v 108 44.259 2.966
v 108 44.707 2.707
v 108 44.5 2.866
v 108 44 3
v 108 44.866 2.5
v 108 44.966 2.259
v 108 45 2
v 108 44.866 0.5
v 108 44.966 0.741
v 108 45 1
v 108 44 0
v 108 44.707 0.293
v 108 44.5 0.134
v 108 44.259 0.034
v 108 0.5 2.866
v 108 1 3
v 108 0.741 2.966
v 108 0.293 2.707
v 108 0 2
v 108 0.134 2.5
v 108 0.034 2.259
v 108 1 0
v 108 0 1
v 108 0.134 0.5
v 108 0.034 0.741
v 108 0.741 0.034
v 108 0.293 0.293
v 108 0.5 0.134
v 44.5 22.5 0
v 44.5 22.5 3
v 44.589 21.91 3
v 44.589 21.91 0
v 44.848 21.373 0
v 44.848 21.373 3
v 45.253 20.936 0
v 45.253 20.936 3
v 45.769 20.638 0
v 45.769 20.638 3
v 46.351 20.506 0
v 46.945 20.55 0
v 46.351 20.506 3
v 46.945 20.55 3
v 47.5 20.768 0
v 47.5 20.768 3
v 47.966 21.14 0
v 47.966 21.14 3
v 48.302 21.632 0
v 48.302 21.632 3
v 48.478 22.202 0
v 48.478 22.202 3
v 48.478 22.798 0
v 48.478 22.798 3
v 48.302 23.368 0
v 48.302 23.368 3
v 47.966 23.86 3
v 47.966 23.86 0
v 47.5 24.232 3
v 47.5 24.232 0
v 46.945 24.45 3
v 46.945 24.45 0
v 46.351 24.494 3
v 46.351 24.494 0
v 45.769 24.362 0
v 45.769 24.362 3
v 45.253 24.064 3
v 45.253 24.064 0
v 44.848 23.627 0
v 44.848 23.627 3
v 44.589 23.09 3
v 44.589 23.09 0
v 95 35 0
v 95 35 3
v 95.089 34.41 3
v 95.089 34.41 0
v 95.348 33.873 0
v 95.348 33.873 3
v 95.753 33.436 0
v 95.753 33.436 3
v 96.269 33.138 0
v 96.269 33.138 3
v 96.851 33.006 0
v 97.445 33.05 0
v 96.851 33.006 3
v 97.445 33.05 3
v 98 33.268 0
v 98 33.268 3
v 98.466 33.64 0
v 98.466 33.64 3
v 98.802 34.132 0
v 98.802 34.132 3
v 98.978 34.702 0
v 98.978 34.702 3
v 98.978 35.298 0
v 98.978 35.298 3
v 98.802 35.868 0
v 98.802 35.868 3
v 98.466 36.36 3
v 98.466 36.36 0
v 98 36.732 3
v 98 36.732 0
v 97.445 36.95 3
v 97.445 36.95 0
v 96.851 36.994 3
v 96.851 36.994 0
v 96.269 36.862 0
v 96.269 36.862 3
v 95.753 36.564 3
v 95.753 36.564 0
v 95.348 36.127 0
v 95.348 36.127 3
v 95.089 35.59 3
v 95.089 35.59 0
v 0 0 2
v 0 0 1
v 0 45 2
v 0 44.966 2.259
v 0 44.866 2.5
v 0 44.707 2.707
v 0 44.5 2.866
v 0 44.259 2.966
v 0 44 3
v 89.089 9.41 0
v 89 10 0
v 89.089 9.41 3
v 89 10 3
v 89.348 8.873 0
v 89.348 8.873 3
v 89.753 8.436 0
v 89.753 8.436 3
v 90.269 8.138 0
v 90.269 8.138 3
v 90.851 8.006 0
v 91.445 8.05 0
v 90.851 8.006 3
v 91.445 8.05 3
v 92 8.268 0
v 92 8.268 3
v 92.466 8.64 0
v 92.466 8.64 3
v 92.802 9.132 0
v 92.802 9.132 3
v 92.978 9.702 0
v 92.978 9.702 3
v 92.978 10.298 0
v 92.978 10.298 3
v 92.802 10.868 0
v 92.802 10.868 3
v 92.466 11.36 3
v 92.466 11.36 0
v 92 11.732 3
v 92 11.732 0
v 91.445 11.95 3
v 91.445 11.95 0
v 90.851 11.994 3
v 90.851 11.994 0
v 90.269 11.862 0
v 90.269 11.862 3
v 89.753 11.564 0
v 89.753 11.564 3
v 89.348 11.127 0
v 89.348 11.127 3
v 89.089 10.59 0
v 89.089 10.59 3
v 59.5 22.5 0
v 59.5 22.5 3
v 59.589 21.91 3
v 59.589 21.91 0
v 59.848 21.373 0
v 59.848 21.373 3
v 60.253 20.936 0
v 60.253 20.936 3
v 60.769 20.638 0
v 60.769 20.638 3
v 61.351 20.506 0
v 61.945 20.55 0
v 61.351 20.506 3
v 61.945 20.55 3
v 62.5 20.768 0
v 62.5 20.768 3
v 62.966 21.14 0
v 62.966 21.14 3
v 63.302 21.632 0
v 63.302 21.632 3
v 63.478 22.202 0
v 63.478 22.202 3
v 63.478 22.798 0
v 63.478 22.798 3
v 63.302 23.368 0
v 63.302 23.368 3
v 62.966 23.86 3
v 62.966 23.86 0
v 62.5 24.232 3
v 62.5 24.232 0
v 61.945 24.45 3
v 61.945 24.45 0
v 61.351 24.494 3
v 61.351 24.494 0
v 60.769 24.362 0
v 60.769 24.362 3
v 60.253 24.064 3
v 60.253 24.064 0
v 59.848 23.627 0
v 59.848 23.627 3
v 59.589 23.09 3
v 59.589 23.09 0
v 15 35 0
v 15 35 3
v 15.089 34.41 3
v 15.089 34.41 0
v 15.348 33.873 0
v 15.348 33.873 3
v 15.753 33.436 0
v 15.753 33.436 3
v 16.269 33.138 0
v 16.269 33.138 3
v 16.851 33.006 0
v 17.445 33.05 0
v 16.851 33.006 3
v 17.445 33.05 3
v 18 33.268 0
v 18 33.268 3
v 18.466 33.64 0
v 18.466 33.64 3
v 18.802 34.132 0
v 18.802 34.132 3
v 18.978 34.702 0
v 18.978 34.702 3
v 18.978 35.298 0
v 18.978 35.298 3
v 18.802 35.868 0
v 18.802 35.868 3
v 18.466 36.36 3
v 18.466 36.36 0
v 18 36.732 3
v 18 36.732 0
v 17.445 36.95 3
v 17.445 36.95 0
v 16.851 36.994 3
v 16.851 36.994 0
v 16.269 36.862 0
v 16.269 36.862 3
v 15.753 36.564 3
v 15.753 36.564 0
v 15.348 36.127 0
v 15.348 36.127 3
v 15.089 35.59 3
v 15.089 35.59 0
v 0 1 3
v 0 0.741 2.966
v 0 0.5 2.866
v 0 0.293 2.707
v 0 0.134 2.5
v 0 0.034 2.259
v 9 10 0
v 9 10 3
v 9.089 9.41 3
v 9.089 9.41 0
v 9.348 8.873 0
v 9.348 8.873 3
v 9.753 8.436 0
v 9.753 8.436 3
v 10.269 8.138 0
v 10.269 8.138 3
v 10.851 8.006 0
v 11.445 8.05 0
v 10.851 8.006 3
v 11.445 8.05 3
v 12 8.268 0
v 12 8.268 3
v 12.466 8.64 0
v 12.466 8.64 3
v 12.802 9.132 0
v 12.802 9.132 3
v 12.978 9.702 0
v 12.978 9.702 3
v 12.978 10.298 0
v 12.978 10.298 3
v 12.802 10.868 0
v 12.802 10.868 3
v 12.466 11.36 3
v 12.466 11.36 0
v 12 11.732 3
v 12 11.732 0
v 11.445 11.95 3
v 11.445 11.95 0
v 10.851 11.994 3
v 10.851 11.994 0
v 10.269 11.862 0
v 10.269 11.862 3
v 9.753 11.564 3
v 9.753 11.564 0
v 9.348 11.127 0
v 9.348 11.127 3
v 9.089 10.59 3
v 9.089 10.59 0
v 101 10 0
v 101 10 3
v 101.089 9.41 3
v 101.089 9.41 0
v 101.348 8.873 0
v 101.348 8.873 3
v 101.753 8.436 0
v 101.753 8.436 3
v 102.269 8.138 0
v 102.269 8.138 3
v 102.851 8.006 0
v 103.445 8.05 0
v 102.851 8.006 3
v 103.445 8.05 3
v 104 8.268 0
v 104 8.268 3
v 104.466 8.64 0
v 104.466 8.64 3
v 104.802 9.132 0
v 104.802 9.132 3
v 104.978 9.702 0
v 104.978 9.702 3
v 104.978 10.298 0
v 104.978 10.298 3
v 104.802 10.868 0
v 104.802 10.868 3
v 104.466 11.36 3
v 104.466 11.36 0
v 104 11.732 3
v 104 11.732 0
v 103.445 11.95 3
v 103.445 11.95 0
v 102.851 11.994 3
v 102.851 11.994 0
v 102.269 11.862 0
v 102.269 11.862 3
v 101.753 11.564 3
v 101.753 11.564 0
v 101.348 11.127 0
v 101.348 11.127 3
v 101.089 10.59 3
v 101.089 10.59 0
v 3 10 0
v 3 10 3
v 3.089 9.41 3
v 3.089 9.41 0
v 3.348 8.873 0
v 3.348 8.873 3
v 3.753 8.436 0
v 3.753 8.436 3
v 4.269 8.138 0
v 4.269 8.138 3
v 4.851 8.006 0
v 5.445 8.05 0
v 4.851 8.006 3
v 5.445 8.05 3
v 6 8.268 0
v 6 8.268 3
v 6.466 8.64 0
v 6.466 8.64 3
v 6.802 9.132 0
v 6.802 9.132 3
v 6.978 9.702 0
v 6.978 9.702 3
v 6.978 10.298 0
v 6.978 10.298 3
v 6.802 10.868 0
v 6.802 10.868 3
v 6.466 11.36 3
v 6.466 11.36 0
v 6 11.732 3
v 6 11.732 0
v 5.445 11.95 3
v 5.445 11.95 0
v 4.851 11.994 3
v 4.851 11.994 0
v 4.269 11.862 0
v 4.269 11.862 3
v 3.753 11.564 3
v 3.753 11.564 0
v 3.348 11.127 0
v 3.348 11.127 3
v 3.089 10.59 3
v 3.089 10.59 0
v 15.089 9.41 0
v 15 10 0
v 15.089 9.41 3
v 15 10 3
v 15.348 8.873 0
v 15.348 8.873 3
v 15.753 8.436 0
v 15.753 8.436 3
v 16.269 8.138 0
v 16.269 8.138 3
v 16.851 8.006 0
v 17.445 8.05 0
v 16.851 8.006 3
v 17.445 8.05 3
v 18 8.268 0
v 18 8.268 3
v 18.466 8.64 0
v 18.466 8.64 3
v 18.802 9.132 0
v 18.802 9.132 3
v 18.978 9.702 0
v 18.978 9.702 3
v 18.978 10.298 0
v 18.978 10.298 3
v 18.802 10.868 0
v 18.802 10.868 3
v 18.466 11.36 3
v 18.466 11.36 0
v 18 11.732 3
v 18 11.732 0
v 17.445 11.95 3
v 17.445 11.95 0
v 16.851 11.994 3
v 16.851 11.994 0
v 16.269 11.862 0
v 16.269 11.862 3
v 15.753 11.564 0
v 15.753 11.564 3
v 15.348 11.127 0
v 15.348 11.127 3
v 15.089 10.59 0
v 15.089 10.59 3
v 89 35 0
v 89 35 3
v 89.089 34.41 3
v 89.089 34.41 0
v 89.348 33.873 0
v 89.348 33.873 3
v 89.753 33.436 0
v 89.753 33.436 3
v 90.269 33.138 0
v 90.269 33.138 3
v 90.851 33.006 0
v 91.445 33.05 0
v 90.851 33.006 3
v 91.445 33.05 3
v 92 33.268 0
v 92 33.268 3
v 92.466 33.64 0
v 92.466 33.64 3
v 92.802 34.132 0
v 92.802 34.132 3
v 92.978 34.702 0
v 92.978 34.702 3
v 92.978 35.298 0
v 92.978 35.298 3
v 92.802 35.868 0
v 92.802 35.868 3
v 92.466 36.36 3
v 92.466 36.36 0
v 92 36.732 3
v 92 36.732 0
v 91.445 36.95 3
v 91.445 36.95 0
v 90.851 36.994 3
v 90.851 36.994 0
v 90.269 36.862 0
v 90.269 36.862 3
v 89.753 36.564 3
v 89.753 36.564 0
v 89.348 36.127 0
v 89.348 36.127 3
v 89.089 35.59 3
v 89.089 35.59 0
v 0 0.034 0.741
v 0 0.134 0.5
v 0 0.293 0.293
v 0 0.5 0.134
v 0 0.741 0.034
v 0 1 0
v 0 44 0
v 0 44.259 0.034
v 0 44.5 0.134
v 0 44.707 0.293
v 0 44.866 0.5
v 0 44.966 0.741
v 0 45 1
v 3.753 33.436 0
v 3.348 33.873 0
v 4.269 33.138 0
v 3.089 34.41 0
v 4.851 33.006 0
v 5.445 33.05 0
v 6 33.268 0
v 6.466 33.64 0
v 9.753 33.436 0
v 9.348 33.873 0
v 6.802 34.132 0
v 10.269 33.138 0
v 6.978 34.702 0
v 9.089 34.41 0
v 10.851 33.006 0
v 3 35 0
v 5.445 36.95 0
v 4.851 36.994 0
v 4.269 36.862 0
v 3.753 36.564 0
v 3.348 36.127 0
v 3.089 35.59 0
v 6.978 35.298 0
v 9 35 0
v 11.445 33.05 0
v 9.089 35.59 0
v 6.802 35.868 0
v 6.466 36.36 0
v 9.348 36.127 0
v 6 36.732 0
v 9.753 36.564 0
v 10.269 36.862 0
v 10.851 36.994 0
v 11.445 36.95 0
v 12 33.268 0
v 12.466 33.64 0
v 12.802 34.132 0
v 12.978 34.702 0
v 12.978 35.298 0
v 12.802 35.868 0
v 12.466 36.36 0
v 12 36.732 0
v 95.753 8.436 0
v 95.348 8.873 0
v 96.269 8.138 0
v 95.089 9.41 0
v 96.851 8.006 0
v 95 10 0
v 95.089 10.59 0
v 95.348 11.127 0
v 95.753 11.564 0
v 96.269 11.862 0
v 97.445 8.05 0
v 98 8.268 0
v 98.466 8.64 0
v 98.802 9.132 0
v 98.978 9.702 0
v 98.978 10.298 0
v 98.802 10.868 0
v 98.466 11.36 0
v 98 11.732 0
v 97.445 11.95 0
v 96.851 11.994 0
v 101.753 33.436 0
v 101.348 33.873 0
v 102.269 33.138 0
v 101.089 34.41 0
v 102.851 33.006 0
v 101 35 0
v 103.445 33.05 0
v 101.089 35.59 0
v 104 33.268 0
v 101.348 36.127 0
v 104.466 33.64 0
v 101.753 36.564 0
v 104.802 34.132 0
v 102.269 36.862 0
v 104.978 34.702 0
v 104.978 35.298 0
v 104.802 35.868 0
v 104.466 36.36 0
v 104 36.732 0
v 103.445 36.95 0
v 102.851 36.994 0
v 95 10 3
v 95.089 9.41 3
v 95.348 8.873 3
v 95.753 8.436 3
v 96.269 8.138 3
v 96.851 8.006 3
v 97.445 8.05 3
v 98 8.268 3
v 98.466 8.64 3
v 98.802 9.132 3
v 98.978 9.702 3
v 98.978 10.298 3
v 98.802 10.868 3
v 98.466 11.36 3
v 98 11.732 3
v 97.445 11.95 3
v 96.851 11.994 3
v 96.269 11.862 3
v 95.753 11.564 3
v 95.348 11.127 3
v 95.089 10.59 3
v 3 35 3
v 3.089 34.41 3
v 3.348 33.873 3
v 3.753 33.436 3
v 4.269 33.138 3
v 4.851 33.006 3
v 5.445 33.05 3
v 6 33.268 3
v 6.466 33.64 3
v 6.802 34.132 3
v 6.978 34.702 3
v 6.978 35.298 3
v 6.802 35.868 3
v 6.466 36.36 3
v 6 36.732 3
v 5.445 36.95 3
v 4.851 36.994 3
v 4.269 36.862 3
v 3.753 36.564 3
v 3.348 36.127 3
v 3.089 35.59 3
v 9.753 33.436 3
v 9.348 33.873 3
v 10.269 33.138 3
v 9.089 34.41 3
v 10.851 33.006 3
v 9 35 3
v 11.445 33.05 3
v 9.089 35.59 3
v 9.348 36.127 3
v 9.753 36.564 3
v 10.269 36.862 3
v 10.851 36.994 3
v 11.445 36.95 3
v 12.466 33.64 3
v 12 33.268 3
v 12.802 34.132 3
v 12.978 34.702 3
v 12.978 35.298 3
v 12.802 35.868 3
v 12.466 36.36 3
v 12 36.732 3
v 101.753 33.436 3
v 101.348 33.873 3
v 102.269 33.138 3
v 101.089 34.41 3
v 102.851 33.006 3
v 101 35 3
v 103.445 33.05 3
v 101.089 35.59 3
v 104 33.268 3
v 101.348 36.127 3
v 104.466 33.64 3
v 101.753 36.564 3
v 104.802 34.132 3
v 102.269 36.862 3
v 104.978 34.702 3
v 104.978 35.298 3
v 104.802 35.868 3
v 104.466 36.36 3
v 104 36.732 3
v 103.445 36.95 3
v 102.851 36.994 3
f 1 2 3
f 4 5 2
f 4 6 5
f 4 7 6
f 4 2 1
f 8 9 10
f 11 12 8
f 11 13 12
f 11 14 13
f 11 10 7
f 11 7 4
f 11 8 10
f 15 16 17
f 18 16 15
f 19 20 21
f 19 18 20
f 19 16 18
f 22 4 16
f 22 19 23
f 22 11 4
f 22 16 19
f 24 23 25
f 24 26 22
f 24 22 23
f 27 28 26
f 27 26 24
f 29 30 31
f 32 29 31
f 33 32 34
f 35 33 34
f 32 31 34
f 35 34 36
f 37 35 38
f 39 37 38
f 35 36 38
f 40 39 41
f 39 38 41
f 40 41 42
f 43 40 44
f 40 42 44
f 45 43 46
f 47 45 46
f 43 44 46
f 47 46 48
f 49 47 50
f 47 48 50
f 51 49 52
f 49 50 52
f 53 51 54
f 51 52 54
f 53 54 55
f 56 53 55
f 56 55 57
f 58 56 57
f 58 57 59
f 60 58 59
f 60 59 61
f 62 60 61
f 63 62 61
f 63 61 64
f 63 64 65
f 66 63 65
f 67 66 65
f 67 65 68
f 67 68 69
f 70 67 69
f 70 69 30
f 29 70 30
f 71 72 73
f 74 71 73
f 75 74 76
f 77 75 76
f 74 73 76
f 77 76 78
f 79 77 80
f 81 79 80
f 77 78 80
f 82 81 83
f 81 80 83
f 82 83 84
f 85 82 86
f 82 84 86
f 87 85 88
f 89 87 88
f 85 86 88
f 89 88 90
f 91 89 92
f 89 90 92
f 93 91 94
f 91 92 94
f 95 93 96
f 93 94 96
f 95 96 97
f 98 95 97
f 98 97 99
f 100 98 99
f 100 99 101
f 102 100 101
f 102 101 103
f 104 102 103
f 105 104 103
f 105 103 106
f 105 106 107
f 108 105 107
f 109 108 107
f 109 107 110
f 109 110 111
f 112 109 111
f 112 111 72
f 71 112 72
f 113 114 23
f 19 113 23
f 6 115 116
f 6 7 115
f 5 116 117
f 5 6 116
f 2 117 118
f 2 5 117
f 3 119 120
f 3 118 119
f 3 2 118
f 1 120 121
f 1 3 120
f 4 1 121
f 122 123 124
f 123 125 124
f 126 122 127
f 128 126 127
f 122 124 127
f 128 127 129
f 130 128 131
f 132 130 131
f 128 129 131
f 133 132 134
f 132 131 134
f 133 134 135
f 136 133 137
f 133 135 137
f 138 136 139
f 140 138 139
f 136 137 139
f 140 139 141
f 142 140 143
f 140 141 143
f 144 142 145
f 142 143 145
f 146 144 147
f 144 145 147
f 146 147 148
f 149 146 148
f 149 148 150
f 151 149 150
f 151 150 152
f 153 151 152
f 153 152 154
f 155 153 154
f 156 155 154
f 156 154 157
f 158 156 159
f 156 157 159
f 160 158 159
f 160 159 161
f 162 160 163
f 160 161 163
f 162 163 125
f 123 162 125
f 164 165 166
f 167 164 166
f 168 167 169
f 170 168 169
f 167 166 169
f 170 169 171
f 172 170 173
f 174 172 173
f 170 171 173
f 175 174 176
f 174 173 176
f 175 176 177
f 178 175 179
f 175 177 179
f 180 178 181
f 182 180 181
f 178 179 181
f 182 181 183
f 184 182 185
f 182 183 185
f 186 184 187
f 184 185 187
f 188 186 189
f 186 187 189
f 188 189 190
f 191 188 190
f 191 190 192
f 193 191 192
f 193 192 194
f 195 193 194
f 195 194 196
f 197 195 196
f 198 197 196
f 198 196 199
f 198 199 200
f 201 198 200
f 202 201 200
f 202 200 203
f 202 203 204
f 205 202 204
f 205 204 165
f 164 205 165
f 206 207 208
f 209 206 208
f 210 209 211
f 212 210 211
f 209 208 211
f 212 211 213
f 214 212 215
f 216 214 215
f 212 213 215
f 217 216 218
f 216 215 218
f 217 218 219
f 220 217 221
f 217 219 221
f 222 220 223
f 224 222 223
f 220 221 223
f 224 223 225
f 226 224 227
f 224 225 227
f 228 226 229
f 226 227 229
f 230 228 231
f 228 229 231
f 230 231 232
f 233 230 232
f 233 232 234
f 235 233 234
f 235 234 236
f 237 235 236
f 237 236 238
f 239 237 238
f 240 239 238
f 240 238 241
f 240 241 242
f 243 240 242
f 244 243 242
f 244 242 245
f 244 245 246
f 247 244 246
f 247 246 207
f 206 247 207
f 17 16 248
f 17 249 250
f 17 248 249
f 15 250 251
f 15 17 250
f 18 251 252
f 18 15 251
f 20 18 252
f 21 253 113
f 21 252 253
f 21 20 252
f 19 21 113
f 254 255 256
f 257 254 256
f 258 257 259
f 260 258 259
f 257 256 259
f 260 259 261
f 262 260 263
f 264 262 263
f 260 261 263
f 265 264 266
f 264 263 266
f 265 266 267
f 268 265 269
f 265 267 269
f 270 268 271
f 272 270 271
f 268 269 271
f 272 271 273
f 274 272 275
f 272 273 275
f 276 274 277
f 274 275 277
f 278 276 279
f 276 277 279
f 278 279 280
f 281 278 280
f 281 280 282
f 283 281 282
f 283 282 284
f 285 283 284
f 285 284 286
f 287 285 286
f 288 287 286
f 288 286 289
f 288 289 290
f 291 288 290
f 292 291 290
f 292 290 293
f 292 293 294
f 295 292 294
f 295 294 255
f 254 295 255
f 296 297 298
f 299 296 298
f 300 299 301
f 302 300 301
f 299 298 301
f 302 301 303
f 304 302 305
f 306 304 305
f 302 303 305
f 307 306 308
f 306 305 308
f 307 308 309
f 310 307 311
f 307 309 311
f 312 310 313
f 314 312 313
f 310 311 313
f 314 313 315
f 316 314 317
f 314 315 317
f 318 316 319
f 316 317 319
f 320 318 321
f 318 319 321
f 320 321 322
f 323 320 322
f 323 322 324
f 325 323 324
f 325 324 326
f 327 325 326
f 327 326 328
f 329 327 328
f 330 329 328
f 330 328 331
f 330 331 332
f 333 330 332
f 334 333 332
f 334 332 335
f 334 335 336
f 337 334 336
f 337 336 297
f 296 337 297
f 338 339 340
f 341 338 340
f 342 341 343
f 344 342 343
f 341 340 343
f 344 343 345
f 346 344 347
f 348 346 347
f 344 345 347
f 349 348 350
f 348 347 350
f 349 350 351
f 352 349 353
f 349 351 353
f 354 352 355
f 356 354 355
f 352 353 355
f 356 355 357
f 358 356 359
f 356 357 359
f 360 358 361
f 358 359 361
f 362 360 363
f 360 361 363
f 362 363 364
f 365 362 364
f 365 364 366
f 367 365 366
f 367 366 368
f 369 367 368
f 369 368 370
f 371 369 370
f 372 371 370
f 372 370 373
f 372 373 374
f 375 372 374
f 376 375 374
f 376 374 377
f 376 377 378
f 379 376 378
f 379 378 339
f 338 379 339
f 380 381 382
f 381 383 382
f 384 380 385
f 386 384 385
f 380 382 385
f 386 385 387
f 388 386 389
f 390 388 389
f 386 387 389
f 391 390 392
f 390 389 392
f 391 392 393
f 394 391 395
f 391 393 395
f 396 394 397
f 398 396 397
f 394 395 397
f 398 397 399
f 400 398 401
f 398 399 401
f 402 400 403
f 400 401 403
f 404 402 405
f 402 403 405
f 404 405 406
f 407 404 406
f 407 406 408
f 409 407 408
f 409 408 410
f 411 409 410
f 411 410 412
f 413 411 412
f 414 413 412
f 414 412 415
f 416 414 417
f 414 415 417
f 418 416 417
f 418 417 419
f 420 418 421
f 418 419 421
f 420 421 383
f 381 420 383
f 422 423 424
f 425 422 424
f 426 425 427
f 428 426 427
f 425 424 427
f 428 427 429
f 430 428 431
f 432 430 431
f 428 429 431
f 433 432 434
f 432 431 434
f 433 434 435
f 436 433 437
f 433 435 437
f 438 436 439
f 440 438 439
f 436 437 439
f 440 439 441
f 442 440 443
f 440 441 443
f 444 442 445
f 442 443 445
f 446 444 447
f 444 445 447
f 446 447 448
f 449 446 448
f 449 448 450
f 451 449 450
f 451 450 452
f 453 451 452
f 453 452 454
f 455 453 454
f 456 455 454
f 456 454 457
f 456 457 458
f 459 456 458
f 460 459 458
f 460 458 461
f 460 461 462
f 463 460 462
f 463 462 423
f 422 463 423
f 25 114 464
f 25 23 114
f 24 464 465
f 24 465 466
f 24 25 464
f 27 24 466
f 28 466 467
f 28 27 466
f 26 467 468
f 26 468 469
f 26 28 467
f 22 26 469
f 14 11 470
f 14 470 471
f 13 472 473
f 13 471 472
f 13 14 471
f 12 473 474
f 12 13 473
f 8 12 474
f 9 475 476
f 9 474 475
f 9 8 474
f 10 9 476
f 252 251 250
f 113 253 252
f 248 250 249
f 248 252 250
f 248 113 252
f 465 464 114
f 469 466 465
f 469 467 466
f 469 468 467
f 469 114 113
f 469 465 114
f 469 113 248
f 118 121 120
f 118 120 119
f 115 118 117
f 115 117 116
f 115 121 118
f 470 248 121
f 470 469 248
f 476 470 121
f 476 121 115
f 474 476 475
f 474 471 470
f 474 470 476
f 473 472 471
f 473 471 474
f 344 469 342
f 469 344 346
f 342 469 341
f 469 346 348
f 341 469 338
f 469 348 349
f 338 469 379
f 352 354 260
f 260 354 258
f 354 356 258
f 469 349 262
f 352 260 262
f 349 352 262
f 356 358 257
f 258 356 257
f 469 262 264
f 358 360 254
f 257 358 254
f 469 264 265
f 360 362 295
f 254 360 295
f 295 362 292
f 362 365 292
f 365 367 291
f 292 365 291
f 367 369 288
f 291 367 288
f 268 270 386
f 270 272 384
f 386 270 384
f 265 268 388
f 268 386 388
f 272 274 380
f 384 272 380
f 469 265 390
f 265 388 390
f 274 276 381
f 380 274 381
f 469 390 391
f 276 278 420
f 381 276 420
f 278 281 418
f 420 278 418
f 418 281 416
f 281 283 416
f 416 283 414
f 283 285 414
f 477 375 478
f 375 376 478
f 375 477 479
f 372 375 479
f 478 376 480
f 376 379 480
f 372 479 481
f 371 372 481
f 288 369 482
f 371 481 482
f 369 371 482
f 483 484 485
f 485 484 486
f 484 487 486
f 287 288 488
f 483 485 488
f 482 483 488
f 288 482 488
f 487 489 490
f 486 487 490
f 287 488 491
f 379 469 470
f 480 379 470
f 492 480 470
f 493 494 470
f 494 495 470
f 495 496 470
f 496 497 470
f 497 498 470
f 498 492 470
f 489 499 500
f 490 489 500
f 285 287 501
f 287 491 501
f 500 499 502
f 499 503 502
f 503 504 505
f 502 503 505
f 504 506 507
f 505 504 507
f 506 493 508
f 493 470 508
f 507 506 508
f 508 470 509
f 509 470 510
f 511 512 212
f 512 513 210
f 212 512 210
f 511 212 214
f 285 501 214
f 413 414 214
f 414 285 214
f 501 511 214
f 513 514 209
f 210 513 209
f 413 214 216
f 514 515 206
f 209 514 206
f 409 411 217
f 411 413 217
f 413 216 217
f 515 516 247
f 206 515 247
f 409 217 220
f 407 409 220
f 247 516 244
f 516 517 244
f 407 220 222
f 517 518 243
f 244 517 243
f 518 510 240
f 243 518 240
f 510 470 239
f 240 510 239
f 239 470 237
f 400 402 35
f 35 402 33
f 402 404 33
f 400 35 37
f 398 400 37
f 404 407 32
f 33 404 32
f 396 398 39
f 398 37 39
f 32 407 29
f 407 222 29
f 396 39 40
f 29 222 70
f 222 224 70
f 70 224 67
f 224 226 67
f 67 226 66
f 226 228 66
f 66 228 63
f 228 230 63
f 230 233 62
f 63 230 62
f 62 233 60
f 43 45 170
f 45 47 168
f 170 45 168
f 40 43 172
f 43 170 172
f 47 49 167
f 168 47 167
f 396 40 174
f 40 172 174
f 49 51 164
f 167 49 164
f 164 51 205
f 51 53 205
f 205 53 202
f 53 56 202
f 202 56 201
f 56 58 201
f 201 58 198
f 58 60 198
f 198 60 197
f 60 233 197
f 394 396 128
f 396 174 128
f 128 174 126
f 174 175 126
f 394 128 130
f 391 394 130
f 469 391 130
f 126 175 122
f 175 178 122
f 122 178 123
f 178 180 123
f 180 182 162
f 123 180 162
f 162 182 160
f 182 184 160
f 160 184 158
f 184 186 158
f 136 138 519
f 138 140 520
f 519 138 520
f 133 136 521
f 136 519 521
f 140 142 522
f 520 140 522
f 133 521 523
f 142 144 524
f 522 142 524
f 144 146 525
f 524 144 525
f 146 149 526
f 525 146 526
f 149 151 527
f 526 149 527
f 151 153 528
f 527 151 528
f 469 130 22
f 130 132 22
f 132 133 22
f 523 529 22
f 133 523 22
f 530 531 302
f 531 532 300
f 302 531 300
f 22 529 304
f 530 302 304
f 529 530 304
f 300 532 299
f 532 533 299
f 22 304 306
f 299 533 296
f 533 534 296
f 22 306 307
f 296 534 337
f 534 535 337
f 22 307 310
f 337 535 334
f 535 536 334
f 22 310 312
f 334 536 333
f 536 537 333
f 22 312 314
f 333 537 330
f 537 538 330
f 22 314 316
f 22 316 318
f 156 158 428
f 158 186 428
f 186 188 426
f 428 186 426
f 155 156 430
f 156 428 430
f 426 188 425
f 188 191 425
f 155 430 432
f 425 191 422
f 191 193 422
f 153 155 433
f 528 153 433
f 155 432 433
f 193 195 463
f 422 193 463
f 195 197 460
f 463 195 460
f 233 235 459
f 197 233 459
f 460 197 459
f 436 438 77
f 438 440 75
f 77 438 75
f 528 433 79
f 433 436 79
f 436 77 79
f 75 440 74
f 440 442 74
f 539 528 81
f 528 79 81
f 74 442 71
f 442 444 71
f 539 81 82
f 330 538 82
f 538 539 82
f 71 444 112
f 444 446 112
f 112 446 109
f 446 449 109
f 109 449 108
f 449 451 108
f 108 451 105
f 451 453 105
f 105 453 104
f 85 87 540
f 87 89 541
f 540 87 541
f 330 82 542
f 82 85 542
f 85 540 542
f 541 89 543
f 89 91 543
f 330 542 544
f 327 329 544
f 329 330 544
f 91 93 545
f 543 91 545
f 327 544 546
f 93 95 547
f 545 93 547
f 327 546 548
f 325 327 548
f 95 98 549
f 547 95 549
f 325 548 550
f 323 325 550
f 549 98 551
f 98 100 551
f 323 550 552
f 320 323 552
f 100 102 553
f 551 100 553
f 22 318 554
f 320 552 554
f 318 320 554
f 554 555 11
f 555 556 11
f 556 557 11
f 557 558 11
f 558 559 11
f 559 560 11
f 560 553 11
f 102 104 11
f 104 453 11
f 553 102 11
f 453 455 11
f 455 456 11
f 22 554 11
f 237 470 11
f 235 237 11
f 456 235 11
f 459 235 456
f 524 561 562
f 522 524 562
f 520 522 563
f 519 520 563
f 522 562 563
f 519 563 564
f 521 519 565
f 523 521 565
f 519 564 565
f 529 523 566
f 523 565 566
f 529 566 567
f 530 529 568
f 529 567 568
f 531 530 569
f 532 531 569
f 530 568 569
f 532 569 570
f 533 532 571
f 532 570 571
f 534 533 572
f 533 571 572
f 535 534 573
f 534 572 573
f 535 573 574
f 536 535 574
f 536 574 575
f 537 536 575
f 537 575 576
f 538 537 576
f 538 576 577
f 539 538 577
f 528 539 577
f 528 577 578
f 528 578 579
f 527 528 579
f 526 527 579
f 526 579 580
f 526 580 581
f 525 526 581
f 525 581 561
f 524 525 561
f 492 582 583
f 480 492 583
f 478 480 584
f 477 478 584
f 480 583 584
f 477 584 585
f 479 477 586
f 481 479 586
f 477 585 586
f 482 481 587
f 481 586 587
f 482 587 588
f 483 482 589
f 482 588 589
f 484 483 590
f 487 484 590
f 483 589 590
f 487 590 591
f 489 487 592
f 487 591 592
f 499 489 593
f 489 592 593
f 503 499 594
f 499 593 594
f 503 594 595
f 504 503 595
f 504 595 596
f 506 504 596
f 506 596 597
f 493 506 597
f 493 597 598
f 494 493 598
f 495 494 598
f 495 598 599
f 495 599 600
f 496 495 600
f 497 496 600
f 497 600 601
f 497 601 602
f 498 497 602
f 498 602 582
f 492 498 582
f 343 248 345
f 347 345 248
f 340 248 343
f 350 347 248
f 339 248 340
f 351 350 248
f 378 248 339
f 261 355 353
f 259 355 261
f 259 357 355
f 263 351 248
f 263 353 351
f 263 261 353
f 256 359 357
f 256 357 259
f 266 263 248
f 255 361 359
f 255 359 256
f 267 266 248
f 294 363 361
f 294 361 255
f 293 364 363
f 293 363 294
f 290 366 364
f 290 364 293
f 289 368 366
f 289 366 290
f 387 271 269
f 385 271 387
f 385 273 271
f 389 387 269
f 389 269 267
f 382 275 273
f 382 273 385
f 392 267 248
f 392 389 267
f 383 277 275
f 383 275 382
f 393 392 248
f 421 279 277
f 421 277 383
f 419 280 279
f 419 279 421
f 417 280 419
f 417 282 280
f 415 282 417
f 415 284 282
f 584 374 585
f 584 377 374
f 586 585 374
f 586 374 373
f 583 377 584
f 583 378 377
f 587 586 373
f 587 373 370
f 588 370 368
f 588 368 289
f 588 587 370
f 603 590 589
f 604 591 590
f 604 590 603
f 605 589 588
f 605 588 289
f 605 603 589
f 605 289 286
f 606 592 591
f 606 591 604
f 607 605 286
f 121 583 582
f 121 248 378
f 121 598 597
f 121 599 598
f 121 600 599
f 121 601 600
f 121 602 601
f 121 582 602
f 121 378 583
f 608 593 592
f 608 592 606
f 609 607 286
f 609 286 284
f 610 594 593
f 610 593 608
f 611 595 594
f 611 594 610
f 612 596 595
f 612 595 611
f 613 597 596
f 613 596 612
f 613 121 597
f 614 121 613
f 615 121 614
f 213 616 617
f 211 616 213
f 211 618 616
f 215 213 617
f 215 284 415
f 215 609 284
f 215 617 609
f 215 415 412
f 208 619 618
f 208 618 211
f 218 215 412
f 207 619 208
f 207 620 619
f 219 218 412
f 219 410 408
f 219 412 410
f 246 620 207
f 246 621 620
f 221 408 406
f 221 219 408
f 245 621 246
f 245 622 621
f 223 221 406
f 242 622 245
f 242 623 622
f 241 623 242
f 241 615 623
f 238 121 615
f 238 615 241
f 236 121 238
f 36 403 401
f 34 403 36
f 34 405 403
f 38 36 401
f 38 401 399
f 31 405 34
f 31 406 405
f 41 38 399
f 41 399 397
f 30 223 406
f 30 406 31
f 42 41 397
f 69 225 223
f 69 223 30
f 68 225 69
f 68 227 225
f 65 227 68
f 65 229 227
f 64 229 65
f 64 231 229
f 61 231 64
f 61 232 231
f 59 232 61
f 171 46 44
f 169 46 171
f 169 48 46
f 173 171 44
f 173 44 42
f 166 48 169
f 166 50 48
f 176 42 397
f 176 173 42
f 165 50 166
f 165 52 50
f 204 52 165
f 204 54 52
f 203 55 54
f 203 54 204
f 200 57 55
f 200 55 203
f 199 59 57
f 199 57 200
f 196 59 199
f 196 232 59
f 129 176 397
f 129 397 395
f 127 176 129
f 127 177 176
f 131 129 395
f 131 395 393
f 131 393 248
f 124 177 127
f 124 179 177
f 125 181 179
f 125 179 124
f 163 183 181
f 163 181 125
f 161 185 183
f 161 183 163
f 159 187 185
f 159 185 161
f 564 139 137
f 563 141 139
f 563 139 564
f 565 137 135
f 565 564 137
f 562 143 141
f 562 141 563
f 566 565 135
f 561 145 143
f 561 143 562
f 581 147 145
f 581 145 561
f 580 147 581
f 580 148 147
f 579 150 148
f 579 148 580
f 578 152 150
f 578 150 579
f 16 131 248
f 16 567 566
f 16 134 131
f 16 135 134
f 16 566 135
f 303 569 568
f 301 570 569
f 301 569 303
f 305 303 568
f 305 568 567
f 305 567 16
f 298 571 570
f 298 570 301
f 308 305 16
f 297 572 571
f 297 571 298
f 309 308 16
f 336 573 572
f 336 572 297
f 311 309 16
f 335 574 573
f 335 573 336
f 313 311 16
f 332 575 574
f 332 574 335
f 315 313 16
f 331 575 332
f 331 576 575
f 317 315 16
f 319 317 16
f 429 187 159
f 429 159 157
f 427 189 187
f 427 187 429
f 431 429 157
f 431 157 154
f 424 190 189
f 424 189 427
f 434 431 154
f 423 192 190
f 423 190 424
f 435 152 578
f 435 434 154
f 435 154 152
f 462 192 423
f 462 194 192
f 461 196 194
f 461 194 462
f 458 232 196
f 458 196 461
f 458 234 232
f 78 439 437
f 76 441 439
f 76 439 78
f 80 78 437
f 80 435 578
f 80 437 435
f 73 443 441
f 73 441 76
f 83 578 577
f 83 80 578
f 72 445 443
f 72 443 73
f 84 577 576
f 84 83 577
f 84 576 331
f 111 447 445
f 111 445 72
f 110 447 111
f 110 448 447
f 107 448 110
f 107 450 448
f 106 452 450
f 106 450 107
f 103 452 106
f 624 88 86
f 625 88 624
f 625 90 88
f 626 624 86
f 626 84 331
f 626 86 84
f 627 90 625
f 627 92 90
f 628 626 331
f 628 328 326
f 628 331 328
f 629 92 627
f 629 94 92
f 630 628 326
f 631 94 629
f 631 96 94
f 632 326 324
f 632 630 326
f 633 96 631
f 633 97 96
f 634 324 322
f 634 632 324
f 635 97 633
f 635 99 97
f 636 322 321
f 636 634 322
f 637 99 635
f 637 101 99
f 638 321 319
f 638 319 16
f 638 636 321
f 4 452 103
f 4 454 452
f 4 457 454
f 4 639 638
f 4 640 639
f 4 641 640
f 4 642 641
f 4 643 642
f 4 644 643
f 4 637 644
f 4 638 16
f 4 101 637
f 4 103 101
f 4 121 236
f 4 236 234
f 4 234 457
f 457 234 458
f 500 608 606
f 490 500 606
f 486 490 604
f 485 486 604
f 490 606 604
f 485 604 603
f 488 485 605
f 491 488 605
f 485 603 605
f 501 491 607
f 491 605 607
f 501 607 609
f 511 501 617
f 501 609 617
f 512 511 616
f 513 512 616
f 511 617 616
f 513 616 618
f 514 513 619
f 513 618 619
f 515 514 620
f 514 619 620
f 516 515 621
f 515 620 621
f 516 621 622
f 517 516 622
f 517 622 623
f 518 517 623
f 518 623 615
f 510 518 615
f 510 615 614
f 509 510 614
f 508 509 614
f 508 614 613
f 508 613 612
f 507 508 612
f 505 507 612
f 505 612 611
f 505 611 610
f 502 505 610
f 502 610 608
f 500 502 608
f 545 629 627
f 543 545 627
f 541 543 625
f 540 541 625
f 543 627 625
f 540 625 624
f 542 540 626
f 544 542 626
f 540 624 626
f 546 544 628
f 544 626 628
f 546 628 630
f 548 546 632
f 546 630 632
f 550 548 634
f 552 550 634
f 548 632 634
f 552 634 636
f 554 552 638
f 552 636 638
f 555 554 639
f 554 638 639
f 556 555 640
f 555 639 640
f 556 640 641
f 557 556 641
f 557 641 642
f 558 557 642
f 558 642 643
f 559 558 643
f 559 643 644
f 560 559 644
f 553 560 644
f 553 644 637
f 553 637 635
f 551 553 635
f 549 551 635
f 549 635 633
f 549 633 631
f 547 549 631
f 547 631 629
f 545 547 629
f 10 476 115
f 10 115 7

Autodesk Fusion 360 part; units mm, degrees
sketch "Sketch7" plane through (0, 0, 0) normal (0, 0, 1) x (1, 0, 0)
  line L0 (0, 0) -> (108, 0)
  line L1 (0, 0) -> (0, 45)
  line L2 (0, 45) -> (108, 45)
  line L3 (108, 45) -> (108, 0)
  dimension "d135" = 108
  dimension "d136" = 45
extrude "Extrude7" add sketch "Sketch7" along normal blind 3
sketch "Sketch8" plane through (0, 0, 3) normal (0, 0, 1) x (-1, 0, 0)
  line L0 (0, 0) -> (-108, 0)
  line L1 (-108, 0) -> (-108, -45)
  line L2 (-108, -45) -> (0, -45)
  line L3 (0, -45) -> (0, 0)
  circle A0 centre (-5, -35) radius 2
  circle A1 centre (-5, -10) radius 2
  circle A2 centre (-11, -35) radius 2
  circle A3 centre (-17, -35) radius 2
  circle A4 centre (-11, -10) radius 2
  circle A5 centre (-17, -10) radius 2
  circle A6 centre (-46.5, -22.5) radius 2
  circle A7 centre (-103, -35) radius 2
  circle A8 centre (-103, -10) radius 2
  circle A9 centre (-97, -10) radius 2
  circle A10 centre (-91, -10) radius 2
  circle A11 centre (-91, -35) radius 2
  circle A12 centre (-97, -35) radius 2
  circle A13 centre (-61.5, -22.5) radius 2
  dimension "d142" = 6
  dimension "d143" = 6
  dimension "d144" = 6
  dimension "d145" = 6
  dimension "d146" = 4
  dimension "d147" = 4
  dimension "d148" = 4
  dimension "d149" = 4
  dimension "d150" = 4
  dimension "d151" = 4
  dimension "d153" = 4
extrude "Extrude8" cut sketch "Sketch8" against normal blind 3 contours A0 | A1 | A2 | A3 | A4 | A5 | A6 | A7 | A8 | A9 | A10 | A11 | A12 | A13
fillet "Fillet13" radius 1 1 edges at (54, 0, 3)
fillet "Fillet14" radius 1 1 edges at (54, 0, 0)
fillet "Fillet15" radius 1 1 edges at (54, 45, 3)
fillet "Fillet16" radius 1 1 edges at (54, 45, 0)
